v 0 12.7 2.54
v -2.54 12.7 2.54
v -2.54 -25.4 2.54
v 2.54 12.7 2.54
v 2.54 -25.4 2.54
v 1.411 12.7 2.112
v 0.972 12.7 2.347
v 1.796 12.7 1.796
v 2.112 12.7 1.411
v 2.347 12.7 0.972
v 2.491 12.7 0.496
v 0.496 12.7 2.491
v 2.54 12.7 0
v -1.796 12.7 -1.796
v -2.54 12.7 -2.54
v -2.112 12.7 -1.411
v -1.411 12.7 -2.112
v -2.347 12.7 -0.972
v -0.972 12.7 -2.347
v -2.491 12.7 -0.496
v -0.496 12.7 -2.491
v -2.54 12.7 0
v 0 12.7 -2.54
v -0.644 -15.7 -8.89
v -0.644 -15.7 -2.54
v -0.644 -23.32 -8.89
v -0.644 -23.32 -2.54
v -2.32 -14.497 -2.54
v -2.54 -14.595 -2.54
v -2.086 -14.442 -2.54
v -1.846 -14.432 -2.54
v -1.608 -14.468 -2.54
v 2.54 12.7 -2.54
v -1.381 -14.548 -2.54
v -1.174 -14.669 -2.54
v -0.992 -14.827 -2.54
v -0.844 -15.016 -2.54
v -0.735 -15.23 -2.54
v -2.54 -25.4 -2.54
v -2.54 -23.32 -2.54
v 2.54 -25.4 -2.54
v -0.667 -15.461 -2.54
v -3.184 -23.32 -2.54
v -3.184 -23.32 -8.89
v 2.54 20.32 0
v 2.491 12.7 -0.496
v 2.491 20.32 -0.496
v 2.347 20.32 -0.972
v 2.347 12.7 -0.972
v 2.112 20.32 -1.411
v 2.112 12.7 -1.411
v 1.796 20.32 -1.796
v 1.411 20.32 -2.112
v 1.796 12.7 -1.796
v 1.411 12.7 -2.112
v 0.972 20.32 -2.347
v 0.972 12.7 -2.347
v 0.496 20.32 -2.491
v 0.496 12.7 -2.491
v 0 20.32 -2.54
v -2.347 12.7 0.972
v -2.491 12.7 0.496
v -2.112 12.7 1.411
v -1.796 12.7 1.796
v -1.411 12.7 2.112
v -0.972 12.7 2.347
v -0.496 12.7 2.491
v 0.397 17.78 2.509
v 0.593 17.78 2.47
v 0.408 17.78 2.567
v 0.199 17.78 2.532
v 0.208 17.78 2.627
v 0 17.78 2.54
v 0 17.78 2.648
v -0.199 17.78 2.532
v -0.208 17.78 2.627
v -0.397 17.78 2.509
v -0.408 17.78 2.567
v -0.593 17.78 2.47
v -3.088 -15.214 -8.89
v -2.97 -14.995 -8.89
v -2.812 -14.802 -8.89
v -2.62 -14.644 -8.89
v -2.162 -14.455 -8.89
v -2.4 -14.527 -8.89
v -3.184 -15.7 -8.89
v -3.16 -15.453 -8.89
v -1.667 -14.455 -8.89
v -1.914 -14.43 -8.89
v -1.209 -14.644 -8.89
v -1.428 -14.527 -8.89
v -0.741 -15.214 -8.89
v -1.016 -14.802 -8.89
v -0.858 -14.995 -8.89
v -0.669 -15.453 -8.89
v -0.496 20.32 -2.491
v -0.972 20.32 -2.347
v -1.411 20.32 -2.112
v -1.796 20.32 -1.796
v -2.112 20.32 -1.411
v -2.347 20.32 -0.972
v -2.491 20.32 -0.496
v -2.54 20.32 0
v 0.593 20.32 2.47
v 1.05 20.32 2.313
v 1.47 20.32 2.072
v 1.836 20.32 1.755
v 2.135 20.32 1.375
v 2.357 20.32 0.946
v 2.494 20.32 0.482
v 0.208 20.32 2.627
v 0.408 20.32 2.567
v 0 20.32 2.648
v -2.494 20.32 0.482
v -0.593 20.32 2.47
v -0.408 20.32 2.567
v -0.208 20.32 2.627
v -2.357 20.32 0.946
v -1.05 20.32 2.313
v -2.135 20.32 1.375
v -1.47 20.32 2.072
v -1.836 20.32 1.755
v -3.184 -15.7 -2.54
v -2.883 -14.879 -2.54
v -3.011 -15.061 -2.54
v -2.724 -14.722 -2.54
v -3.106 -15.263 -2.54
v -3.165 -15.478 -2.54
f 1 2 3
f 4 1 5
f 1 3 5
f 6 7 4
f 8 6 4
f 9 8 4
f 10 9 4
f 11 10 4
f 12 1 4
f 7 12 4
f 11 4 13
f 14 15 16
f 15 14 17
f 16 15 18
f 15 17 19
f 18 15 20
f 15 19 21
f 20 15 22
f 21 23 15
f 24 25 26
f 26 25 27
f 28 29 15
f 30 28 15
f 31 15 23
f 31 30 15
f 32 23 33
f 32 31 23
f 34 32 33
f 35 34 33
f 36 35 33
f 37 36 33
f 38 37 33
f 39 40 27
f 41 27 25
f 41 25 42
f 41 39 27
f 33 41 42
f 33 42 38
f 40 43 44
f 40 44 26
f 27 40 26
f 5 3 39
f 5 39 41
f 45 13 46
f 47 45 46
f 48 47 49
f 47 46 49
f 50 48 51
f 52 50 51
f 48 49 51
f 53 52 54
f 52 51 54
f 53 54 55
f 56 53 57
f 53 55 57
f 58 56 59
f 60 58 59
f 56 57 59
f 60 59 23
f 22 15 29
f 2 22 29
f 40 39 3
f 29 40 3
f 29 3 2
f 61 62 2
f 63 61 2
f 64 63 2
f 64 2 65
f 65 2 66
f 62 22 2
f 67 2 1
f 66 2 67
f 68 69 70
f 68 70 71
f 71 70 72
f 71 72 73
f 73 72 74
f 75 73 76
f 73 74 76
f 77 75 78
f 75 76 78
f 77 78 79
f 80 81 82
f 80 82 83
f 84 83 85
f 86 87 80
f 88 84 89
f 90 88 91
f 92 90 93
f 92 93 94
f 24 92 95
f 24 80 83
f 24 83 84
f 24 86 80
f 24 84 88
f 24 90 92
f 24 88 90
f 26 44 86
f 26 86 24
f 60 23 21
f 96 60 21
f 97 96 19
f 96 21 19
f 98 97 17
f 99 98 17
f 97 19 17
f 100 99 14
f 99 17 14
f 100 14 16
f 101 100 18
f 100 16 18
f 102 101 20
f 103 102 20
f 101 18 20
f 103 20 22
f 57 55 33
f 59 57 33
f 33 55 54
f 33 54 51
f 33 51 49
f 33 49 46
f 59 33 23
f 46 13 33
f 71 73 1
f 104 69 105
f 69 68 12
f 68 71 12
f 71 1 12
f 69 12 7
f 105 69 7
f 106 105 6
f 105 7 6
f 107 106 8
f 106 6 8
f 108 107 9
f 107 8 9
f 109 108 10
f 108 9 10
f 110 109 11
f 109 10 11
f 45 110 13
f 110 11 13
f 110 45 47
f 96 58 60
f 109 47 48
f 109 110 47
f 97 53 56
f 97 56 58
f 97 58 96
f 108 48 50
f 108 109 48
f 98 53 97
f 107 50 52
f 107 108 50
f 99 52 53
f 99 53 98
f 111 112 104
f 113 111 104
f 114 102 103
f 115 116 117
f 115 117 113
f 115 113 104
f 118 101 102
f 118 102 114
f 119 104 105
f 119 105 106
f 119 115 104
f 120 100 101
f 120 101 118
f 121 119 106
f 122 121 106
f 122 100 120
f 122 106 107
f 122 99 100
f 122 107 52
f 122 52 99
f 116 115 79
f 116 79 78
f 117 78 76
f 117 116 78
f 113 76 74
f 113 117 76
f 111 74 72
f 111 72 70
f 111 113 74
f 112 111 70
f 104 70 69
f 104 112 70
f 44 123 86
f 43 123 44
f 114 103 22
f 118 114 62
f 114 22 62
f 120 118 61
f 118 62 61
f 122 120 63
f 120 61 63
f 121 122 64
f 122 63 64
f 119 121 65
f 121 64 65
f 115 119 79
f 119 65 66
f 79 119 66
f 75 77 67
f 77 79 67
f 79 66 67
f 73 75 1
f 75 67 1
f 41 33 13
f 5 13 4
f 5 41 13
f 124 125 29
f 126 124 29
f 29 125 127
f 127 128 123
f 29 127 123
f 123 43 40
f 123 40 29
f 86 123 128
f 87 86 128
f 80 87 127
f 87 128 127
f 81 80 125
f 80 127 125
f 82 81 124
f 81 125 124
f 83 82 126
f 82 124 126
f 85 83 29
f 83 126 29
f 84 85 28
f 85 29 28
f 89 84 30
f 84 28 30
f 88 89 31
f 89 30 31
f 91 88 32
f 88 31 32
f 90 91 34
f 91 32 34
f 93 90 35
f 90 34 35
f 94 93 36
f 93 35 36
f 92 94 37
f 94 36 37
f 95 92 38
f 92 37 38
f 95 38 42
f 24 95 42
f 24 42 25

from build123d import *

# Parameters (mm, degrees)
F0_W     = 5.08
F0_H     = 5.08
F1_DEPTH = 25.4
F2_W     = 2.54
F2_H     = 7.62
F3_DEPTH = 6.35
F4_DEPTH = 12.7
F6_DEPTH = 7.62
F8_DEPTH = 2.54


with BuildPart() as f1:
    # F0 (on Front) → F1 (new body)
    with BuildSketch(Plane.XZ):
        Rectangle(F0_W, F0_H)
    extrude(amount=F1_DEPTH)

    # F2 (on face) → F3 (join)
    with BuildSketch(Plane(origin=(0, 0, -2.54), x_dir=(1, 0, 0), z_dir=(0, 0, -1))):
        with Locations((-1.9143006529, 19.5104427957)):
            Rectangle(F2_W, F2_H)
        with BuildLine():
            Line((-0.6443006529, 15.7004427957), (-3.1843006529, 15.7004427957))
            ThreePointArc((-3.1843006529, 15.7004427957), (-1.9143006529, 14.4304427957), (-0.6443006529, 15.7004427957))
        make_face()
    extrude(amount=F3_DEPTH)

    # F4 (add): a face of the model
    f4_faces = [f1.faces().sort_by_distance(p)[0] for p in [
        (0, 0, 0),
    ]]
    extrude(f4_faces, amount=F4_DEPTH)

    # F5 (on face) → F6 (join)
    with BuildSketch(Plane(origin=(0, 12.7, 0), x_dir=(-1, 0, 0), z_dir=(0, 1, 0))):
        with BuildLine():
            ThreePointArc((0, -2.54), (1.7960512242, -1.7960512242), (2.54, 0))
            ThreePointArc((2.54, 0), (1.7960512242, 1.7960512242), (0, 2.54))
            ThreePointArc((0, 2.54), (-1.7960512242, 1.7960512242), (-2.54, 0))
            ThreePointArc((-2.54, 0), (-1.7960512242, -1.7960512242), (0, -2.54))
        make_face()
    extrude(amount=F6_DEPTH)

    # F7 (on face) → F8 (join)
    with BuildSketch(Plane(origin=(0, 20.32, 0), x_dir=(-1, 0, 0), z_dir=(0, 1, 0))):
        with BuildLine():
            ThreePointArc((0.5929512242, 2.4698195978), (0, 2.6476778516), (-0.5929512242, 2.4698195978))
            ThreePointArc((-0.5929512242, 2.4698195978), (0, 2.54), (0.5929512242, 2.4698195978))
        make_face()
    extrude(amount=-F8_DEPTH)


solid = f1.part
